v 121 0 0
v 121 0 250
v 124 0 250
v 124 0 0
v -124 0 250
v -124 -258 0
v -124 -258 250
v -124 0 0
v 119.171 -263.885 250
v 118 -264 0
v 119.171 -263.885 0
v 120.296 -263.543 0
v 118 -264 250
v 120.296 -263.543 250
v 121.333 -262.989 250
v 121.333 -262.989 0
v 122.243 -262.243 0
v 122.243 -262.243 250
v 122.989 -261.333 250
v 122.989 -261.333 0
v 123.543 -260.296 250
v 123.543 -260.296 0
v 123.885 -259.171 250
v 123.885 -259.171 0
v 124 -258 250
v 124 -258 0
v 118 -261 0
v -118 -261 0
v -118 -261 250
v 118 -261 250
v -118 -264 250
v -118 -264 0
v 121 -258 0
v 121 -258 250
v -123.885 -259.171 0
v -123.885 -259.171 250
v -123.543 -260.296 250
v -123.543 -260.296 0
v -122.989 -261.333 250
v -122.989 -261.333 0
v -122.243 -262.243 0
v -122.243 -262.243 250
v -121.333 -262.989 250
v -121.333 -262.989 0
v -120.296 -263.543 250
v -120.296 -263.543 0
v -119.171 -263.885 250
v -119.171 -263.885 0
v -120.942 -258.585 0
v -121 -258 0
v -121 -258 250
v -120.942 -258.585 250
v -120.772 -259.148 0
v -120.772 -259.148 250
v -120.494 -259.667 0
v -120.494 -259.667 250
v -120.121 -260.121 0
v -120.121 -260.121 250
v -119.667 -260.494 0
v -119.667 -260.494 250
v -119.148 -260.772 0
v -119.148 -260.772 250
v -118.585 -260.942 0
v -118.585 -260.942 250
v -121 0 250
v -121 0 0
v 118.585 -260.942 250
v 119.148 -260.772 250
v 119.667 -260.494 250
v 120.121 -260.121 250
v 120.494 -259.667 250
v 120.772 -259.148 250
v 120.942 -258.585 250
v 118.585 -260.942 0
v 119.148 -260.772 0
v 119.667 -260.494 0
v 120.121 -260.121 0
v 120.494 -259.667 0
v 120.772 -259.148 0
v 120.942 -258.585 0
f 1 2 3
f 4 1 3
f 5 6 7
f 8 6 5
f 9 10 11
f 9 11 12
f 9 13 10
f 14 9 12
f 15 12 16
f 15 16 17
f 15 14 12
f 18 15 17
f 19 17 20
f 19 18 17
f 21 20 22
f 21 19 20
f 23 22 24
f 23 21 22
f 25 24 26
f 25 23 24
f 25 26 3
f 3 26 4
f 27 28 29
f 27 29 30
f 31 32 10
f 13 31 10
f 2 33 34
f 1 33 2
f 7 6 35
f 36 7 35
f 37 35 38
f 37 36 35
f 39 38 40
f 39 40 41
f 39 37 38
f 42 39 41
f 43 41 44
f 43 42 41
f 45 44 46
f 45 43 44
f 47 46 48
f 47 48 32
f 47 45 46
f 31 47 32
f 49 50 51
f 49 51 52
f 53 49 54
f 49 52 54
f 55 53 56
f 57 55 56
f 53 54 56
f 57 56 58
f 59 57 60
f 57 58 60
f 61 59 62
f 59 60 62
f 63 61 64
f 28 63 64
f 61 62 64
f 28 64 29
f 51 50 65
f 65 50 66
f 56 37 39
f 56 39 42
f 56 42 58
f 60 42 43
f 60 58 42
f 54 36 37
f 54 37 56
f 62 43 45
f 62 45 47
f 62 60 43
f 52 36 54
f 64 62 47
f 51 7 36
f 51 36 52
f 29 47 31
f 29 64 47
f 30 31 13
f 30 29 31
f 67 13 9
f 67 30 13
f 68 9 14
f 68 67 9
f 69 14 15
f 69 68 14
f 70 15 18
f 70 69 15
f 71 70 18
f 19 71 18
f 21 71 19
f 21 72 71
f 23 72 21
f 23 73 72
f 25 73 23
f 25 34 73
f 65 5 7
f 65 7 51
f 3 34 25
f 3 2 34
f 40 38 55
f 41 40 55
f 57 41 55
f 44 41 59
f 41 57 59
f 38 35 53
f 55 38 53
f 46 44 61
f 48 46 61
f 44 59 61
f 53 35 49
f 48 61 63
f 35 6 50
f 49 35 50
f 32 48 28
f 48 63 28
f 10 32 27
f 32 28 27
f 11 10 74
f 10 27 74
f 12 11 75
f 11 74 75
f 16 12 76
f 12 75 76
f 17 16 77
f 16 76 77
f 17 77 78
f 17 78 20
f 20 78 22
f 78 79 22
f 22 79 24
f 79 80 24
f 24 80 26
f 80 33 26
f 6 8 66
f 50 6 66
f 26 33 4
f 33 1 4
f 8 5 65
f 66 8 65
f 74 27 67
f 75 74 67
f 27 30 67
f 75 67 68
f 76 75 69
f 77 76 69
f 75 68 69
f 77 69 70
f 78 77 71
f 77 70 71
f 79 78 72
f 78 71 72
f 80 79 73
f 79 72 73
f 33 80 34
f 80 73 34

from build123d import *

# Parameters (mm, degrees)
SKETCH002_W  = 248
SKETCH002_H  = 264
PAD002_DEPTH = 250
FILLET002_R  = 6
THICKNESS_T  = -3


with BuildPart() as part:
    # Sketch002 → Pad002 (new body)
    with BuildSketch(Plane.XY):
        with Locations((0, -132)):
            Rectangle(SKETCH002_W, SKETCH002_H)
    extrude(amount=PAD002_DEPTH)

    # Fillet002
    fillet002_edges = [part.edges().sort_by_distance(p)[0] for p in [
        (124, -264, 125),
        (-124, -264, 125),
    ]]
    fillet(fillet002_edges, radius=FILLET002_R)

    # Thickness
    thickness_openings = [part.faces().sort_by_distance(p)[0] for p in [
        (0, -131.969157, 250),
        (0, 0, 125),
        (0, -131.969157, 0),
    ]]
    offset(amount=THICKNESS_T, openings=thickness_openings)


solid = part.part
